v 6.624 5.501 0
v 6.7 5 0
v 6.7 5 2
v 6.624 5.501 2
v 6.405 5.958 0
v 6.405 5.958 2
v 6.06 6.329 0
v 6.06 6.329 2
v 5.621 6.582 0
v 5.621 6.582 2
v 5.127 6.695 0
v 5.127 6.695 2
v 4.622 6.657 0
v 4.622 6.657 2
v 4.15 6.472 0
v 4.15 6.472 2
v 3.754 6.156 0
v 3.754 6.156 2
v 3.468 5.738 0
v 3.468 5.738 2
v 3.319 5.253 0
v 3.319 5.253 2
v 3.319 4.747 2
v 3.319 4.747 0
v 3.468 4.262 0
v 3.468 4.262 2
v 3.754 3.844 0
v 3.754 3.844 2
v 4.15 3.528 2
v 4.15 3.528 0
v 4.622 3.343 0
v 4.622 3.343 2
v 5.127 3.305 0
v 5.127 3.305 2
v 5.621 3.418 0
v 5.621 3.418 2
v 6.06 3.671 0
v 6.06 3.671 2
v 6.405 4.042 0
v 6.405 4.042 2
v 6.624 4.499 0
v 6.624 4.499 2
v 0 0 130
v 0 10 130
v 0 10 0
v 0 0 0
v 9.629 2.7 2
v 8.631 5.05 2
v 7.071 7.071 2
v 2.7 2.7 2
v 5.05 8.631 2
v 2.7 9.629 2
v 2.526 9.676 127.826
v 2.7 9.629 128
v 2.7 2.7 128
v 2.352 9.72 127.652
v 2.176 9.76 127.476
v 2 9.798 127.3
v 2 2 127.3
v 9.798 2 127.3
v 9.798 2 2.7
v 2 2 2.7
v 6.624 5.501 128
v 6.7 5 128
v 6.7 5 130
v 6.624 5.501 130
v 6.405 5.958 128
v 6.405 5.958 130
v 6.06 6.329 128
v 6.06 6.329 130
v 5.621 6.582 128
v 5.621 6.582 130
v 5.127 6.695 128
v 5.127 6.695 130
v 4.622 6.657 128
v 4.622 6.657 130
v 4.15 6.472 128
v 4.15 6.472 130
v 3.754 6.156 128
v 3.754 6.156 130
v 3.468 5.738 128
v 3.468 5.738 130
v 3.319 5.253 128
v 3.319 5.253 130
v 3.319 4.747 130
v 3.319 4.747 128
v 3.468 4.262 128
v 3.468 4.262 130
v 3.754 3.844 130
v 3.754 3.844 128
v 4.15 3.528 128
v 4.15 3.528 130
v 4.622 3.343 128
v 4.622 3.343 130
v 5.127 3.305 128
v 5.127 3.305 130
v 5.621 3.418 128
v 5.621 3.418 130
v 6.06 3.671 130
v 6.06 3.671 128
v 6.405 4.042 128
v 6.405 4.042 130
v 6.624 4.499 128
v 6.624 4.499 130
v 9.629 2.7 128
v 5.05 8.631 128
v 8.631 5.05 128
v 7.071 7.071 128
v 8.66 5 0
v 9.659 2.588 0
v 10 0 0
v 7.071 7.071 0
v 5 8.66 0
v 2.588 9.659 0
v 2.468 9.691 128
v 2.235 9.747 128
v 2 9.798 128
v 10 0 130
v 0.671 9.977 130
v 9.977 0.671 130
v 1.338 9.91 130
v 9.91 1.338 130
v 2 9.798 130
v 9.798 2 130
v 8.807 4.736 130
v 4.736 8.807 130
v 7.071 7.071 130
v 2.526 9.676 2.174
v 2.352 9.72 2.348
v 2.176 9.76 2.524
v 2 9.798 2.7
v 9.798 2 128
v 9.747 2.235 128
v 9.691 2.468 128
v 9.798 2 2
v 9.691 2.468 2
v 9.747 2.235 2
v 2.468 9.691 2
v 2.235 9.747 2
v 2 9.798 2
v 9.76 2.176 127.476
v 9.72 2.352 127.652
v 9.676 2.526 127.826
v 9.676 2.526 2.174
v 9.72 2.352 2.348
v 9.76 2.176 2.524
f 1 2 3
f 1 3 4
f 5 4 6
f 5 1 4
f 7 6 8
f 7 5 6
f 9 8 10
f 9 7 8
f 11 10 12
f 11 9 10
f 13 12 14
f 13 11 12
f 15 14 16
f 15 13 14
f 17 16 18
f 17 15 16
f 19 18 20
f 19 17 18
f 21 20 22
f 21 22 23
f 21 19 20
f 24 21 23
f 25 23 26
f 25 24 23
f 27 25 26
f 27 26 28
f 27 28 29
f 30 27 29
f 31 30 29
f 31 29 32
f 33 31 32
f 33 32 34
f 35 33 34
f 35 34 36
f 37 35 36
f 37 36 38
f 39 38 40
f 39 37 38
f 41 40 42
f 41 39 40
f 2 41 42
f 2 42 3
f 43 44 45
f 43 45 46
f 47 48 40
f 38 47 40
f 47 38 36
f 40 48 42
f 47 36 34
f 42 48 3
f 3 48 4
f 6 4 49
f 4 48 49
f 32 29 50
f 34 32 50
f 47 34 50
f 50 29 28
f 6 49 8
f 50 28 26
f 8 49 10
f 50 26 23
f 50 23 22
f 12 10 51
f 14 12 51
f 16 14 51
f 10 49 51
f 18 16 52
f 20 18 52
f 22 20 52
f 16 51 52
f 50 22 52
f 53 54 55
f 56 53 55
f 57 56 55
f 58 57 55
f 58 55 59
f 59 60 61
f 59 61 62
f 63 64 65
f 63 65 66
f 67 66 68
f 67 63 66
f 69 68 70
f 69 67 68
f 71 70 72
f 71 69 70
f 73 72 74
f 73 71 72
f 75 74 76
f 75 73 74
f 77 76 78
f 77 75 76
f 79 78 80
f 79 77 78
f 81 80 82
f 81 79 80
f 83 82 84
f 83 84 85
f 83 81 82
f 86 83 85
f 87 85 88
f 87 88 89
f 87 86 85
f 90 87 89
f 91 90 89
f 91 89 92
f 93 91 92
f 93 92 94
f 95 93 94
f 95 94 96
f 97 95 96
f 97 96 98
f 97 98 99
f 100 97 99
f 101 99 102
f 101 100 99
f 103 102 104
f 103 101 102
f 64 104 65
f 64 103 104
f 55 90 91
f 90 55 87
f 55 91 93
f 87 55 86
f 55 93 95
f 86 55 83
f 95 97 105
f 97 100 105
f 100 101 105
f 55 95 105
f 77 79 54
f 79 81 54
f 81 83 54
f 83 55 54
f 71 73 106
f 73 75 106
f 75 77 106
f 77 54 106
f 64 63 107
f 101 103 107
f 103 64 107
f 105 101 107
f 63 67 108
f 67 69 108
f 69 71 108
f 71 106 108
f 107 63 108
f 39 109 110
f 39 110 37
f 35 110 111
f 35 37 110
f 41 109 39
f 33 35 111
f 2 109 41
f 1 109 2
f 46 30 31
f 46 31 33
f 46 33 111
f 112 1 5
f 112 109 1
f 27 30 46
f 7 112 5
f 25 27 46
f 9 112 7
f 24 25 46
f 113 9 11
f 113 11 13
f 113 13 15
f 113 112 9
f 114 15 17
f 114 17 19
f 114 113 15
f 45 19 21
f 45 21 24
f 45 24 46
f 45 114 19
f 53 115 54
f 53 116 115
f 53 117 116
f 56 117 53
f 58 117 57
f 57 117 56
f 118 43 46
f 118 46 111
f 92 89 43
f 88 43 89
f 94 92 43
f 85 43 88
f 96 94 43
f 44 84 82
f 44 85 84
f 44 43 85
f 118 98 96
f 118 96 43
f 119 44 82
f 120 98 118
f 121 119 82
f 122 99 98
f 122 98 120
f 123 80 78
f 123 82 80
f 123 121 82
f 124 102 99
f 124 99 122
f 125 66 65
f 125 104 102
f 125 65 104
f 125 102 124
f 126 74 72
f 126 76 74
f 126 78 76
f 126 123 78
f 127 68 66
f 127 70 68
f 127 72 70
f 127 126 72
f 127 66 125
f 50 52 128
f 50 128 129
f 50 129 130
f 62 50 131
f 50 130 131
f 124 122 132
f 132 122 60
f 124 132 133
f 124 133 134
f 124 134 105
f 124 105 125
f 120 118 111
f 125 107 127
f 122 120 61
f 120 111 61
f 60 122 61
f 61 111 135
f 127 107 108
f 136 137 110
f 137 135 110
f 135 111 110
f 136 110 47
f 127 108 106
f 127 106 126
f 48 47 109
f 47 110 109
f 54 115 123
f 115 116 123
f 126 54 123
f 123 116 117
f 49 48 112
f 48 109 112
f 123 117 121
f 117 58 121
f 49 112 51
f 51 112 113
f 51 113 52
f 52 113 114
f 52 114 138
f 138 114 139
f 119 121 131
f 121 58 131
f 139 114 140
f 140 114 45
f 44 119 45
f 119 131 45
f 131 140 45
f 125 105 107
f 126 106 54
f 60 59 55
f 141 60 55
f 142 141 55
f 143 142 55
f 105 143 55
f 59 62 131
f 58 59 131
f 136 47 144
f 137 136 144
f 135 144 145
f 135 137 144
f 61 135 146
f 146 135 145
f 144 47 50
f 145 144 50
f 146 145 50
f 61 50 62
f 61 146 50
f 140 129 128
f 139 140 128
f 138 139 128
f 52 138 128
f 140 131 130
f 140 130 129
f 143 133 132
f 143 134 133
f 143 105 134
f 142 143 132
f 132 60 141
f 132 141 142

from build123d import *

# Parameters (mm, degrees)
SKETCH1_R           = 1.7
BOSS_EXTRUDE1_DEPTH = 2
SKETCH2_W           = 2
SKETCH2_H           = 2
BOSS_EXTRUDE2_DEPTH = 126
SKETCH3_R           = 1.7
BOSS_EXTRUDE3_DEPTH = 2
CHAMFER1_SIZE       = 0.7


with BuildPart() as part:
    # Sketch1 → Boss-Extrude1 (new body)
    with BuildSketch(Plane.XY):
        with BuildLine():
            Line((0, 0), (0, 10))
            ThreePointArc((0, 10), (7.071067812, 7.071067812), (10, 0))
            Line((10, 0), (0, 0))
        make_face()
        with Locations((5, 5)):
            Circle(SKETCH1_R, mode=Mode.SUBTRACT)
    extrude(amount=BOSS_EXTRUDE1_DEPTH)

    # Sketch2 → Boss-Extrude2 (add)
    with BuildSketch(Plane.XY.offset(2)):
        with Locations((1, 1)):
            Rectangle(SKETCH2_W, SKETCH2_H)
        with BuildLine():
            Line((0, 10), (0, 2))
            Line((0, 2), (2, 2))
            Line((2, 2), (2, 9.797958971))
            ThreePointArc((2, 9.797958971), (1.00508962, 9.94936153), (0, 10))
        make_face()
        with BuildLine():
            Line((2, 2), (2, 0))
            Line((2, 0), (10, 0))
            ThreePointArc((10, 0), (9.94936153, 1.00508962), (9.797958971, 2))
            Line((9.797958971, 2), (2, 2))
        make_face()
    extrude(amount=BOSS_EXTRUDE2_DEPTH)

    # Sketch3 → Boss-Extrude3 (add)
    # profile 1 of 2: a face of its own
    with BuildSketch(Plane.XY.offset(128)):
        with BuildLine():
            ThreePointArc((9.797958971, 2), (7.071067812, 7.071067812), (2, 9.797958971))
            Line((2, 9.797958971), (2, 2))
            Line((2, 2), (9.797958971, 2))
        make_face()
        with Locations((5, 5)):
            Circle(SKETCH3_R, mode=Mode.SUBTRACT)
    # profile 2 of 2: a face of its own
    with BuildSketch(Plane.XY.offset(128)):
        with BuildLine():
            ThreePointArc((10, 0), (9.94936153, 1.00508962), (9.797958971, 2))
            Line((9.797958971, 2), (2, 2))
            Line((2, 2), (2, 9.797958971))
            ThreePointArc((2, 9.797958971), (1.00508962, 9.94936153), (0, 10))
            Line((0, 10), (0, 0))
            Line((0, 0), (10, 0))
        make_face()
    extrude(amount=BOSS_EXTRUDE3_DEPTH)

    # Chamfer1
    # the kernel refuses this chamfer: 0.7 mm, written as the material it adds along each edge
    with BuildSketch(Plane(origin=(11.598137063, 2, 128), x_dir=(0, -0.027495876610586324, -0.9996219169112966), z_dir=(-1, 0, 0))) as chamfer1_piece_1_section:
        Polygon((CHAMFER1_SIZE * 0.999621916911, -CHAMFER1_SIZE * 0.0274958766106), (-CHAMFER1_SIZE * 0.0274958766106, -CHAMFER1_SIZE * 0.999621916911), (0, 0), align=None)
    chamfer1_piece_1 = extrude(amount=11.398315154, mode=Mode.PRIVATE)
    chamfer1_piece_1 = chamfer1_piece_1 & Plane(origin=(0, 0, 127.768642056), x_dir=(0, 1, 0), z_dir=(0, 0, -1)) * Cylinder(10, 26, mode=Mode.PRIVATE)
    add(chamfer1_piece_1)
    with BuildSketch(Plane(origin=(2, 11.598137063, 2), x_dir=(0.9996219169112968, 0, -0.027495876610586445), z_dir=(0, -1, 0))) as chamfer1_piece_2_section:
        Polygon((CHAMFER1_SIZE * 0.999621916911, CHAMFER1_SIZE * 0.0274958766106), (-CHAMFER1_SIZE * 0.0274958766106, CHAMFER1_SIZE * 0.999621916911), (0, 0), align=None)
    chamfer1_piece_2 = extrude(amount=11.398315154, mode=Mode.PRIVATE)
    chamfer1_piece_2 = chamfer1_piece_2 & Plane(origin=(0, 0, 2.231357944), x_dir=(0, 1, 0), z_dir=(0, 0, -1)) * Cylinder(10, 26, mode=Mode.PRIVATE)
    add(chamfer1_piece_2)
    with BuildSketch(Plane(origin=(2, 0.199821908, 128), x_dir=(0.9996219169112962, 0, 0.027495876610605856), z_dir=(0, 1, 0))) as chamfer1_piece_3_section:
        Polygon((CHAMFER1_SIZE * 0.999621916911, CHAMFER1_SIZE * 0.0274958766106), (-CHAMFER1_SIZE * 0.0274958766106, CHAMFER1_SIZE * 0.999621916911), (0, 0), align=None)
    chamfer1_piece_3 = extrude(amount=11.398315154, mode=Mode.PRIVATE)
    chamfer1_piece_3 = chamfer1_piece_3 & Plane(origin=(0, 0, 127.769144461), x_dir=(0, 1, 0), z_dir=(0, 0, -1)) * Cylinder(10, 26, mode=Mode.PRIVATE)
    add(chamfer1_piece_3)
    with BuildSketch(Plane(origin=(11.598137063, 2, 2), x_dir=(0, 0.9996219169112968, -0.027495876610586445), z_dir=(-1, 0, 0))) as chamfer1_piece_4_section:
        Polygon((CHAMFER1_SIZE * 0.999621916911, -CHAMFER1_SIZE * 0.0274958766106), (-CHAMFER1_SIZE * 0.0274958766106, -CHAMFER1_SIZE * 0.999621916911), (0, 0), align=None)
    chamfer1_piece_4 = extrude(amount=11.398315154, mode=Mode.PRIVATE)
    chamfer1_piece_4 = chamfer1_piece_4 & Plane(origin=(0, 0, 2.231357944), x_dir=(0, 1, 0), z_dir=(0, 0, -1)) * Cylinder(10, 26, mode=Mode.PRIVATE)
    add(chamfer1_piece_4)


solid = part.part
